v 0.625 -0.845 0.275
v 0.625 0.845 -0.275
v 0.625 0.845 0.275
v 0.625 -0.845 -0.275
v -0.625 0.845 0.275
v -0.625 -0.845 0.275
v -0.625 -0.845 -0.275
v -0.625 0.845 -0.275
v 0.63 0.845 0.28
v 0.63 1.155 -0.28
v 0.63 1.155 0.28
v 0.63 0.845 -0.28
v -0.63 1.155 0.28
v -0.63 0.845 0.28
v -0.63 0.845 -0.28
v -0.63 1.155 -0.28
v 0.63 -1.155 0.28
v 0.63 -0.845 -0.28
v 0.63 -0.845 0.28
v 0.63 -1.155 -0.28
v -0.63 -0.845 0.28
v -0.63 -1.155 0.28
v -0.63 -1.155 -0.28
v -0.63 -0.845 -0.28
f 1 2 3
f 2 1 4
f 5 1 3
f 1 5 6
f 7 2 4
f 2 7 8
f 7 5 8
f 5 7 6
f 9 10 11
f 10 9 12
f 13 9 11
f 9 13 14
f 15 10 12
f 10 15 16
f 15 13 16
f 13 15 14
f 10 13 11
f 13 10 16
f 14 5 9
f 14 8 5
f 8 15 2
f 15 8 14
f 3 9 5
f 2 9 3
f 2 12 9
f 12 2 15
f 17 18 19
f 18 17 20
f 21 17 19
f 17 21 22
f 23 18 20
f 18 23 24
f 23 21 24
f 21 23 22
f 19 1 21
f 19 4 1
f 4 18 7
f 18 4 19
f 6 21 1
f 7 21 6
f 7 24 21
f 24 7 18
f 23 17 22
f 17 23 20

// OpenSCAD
/**
 * @brief  SMD 0805
 * @author nimisbert
 * @dims   [mm]
**/

L = 2.00; // length
W = 1.25; // width
H = 0.55; // height
C = 0.30; // Wrap around length

color("#555555")
cube([W,L,H],true);

color("#bbbbbb")
translate([0,L/2,0])
cube([W+0.01,C+0.01,H+0.01],true);

translate([0,-L/2,0])
color("#bbbbbb")
cube([W+0.01,C+0.01,H+0.01],true);
